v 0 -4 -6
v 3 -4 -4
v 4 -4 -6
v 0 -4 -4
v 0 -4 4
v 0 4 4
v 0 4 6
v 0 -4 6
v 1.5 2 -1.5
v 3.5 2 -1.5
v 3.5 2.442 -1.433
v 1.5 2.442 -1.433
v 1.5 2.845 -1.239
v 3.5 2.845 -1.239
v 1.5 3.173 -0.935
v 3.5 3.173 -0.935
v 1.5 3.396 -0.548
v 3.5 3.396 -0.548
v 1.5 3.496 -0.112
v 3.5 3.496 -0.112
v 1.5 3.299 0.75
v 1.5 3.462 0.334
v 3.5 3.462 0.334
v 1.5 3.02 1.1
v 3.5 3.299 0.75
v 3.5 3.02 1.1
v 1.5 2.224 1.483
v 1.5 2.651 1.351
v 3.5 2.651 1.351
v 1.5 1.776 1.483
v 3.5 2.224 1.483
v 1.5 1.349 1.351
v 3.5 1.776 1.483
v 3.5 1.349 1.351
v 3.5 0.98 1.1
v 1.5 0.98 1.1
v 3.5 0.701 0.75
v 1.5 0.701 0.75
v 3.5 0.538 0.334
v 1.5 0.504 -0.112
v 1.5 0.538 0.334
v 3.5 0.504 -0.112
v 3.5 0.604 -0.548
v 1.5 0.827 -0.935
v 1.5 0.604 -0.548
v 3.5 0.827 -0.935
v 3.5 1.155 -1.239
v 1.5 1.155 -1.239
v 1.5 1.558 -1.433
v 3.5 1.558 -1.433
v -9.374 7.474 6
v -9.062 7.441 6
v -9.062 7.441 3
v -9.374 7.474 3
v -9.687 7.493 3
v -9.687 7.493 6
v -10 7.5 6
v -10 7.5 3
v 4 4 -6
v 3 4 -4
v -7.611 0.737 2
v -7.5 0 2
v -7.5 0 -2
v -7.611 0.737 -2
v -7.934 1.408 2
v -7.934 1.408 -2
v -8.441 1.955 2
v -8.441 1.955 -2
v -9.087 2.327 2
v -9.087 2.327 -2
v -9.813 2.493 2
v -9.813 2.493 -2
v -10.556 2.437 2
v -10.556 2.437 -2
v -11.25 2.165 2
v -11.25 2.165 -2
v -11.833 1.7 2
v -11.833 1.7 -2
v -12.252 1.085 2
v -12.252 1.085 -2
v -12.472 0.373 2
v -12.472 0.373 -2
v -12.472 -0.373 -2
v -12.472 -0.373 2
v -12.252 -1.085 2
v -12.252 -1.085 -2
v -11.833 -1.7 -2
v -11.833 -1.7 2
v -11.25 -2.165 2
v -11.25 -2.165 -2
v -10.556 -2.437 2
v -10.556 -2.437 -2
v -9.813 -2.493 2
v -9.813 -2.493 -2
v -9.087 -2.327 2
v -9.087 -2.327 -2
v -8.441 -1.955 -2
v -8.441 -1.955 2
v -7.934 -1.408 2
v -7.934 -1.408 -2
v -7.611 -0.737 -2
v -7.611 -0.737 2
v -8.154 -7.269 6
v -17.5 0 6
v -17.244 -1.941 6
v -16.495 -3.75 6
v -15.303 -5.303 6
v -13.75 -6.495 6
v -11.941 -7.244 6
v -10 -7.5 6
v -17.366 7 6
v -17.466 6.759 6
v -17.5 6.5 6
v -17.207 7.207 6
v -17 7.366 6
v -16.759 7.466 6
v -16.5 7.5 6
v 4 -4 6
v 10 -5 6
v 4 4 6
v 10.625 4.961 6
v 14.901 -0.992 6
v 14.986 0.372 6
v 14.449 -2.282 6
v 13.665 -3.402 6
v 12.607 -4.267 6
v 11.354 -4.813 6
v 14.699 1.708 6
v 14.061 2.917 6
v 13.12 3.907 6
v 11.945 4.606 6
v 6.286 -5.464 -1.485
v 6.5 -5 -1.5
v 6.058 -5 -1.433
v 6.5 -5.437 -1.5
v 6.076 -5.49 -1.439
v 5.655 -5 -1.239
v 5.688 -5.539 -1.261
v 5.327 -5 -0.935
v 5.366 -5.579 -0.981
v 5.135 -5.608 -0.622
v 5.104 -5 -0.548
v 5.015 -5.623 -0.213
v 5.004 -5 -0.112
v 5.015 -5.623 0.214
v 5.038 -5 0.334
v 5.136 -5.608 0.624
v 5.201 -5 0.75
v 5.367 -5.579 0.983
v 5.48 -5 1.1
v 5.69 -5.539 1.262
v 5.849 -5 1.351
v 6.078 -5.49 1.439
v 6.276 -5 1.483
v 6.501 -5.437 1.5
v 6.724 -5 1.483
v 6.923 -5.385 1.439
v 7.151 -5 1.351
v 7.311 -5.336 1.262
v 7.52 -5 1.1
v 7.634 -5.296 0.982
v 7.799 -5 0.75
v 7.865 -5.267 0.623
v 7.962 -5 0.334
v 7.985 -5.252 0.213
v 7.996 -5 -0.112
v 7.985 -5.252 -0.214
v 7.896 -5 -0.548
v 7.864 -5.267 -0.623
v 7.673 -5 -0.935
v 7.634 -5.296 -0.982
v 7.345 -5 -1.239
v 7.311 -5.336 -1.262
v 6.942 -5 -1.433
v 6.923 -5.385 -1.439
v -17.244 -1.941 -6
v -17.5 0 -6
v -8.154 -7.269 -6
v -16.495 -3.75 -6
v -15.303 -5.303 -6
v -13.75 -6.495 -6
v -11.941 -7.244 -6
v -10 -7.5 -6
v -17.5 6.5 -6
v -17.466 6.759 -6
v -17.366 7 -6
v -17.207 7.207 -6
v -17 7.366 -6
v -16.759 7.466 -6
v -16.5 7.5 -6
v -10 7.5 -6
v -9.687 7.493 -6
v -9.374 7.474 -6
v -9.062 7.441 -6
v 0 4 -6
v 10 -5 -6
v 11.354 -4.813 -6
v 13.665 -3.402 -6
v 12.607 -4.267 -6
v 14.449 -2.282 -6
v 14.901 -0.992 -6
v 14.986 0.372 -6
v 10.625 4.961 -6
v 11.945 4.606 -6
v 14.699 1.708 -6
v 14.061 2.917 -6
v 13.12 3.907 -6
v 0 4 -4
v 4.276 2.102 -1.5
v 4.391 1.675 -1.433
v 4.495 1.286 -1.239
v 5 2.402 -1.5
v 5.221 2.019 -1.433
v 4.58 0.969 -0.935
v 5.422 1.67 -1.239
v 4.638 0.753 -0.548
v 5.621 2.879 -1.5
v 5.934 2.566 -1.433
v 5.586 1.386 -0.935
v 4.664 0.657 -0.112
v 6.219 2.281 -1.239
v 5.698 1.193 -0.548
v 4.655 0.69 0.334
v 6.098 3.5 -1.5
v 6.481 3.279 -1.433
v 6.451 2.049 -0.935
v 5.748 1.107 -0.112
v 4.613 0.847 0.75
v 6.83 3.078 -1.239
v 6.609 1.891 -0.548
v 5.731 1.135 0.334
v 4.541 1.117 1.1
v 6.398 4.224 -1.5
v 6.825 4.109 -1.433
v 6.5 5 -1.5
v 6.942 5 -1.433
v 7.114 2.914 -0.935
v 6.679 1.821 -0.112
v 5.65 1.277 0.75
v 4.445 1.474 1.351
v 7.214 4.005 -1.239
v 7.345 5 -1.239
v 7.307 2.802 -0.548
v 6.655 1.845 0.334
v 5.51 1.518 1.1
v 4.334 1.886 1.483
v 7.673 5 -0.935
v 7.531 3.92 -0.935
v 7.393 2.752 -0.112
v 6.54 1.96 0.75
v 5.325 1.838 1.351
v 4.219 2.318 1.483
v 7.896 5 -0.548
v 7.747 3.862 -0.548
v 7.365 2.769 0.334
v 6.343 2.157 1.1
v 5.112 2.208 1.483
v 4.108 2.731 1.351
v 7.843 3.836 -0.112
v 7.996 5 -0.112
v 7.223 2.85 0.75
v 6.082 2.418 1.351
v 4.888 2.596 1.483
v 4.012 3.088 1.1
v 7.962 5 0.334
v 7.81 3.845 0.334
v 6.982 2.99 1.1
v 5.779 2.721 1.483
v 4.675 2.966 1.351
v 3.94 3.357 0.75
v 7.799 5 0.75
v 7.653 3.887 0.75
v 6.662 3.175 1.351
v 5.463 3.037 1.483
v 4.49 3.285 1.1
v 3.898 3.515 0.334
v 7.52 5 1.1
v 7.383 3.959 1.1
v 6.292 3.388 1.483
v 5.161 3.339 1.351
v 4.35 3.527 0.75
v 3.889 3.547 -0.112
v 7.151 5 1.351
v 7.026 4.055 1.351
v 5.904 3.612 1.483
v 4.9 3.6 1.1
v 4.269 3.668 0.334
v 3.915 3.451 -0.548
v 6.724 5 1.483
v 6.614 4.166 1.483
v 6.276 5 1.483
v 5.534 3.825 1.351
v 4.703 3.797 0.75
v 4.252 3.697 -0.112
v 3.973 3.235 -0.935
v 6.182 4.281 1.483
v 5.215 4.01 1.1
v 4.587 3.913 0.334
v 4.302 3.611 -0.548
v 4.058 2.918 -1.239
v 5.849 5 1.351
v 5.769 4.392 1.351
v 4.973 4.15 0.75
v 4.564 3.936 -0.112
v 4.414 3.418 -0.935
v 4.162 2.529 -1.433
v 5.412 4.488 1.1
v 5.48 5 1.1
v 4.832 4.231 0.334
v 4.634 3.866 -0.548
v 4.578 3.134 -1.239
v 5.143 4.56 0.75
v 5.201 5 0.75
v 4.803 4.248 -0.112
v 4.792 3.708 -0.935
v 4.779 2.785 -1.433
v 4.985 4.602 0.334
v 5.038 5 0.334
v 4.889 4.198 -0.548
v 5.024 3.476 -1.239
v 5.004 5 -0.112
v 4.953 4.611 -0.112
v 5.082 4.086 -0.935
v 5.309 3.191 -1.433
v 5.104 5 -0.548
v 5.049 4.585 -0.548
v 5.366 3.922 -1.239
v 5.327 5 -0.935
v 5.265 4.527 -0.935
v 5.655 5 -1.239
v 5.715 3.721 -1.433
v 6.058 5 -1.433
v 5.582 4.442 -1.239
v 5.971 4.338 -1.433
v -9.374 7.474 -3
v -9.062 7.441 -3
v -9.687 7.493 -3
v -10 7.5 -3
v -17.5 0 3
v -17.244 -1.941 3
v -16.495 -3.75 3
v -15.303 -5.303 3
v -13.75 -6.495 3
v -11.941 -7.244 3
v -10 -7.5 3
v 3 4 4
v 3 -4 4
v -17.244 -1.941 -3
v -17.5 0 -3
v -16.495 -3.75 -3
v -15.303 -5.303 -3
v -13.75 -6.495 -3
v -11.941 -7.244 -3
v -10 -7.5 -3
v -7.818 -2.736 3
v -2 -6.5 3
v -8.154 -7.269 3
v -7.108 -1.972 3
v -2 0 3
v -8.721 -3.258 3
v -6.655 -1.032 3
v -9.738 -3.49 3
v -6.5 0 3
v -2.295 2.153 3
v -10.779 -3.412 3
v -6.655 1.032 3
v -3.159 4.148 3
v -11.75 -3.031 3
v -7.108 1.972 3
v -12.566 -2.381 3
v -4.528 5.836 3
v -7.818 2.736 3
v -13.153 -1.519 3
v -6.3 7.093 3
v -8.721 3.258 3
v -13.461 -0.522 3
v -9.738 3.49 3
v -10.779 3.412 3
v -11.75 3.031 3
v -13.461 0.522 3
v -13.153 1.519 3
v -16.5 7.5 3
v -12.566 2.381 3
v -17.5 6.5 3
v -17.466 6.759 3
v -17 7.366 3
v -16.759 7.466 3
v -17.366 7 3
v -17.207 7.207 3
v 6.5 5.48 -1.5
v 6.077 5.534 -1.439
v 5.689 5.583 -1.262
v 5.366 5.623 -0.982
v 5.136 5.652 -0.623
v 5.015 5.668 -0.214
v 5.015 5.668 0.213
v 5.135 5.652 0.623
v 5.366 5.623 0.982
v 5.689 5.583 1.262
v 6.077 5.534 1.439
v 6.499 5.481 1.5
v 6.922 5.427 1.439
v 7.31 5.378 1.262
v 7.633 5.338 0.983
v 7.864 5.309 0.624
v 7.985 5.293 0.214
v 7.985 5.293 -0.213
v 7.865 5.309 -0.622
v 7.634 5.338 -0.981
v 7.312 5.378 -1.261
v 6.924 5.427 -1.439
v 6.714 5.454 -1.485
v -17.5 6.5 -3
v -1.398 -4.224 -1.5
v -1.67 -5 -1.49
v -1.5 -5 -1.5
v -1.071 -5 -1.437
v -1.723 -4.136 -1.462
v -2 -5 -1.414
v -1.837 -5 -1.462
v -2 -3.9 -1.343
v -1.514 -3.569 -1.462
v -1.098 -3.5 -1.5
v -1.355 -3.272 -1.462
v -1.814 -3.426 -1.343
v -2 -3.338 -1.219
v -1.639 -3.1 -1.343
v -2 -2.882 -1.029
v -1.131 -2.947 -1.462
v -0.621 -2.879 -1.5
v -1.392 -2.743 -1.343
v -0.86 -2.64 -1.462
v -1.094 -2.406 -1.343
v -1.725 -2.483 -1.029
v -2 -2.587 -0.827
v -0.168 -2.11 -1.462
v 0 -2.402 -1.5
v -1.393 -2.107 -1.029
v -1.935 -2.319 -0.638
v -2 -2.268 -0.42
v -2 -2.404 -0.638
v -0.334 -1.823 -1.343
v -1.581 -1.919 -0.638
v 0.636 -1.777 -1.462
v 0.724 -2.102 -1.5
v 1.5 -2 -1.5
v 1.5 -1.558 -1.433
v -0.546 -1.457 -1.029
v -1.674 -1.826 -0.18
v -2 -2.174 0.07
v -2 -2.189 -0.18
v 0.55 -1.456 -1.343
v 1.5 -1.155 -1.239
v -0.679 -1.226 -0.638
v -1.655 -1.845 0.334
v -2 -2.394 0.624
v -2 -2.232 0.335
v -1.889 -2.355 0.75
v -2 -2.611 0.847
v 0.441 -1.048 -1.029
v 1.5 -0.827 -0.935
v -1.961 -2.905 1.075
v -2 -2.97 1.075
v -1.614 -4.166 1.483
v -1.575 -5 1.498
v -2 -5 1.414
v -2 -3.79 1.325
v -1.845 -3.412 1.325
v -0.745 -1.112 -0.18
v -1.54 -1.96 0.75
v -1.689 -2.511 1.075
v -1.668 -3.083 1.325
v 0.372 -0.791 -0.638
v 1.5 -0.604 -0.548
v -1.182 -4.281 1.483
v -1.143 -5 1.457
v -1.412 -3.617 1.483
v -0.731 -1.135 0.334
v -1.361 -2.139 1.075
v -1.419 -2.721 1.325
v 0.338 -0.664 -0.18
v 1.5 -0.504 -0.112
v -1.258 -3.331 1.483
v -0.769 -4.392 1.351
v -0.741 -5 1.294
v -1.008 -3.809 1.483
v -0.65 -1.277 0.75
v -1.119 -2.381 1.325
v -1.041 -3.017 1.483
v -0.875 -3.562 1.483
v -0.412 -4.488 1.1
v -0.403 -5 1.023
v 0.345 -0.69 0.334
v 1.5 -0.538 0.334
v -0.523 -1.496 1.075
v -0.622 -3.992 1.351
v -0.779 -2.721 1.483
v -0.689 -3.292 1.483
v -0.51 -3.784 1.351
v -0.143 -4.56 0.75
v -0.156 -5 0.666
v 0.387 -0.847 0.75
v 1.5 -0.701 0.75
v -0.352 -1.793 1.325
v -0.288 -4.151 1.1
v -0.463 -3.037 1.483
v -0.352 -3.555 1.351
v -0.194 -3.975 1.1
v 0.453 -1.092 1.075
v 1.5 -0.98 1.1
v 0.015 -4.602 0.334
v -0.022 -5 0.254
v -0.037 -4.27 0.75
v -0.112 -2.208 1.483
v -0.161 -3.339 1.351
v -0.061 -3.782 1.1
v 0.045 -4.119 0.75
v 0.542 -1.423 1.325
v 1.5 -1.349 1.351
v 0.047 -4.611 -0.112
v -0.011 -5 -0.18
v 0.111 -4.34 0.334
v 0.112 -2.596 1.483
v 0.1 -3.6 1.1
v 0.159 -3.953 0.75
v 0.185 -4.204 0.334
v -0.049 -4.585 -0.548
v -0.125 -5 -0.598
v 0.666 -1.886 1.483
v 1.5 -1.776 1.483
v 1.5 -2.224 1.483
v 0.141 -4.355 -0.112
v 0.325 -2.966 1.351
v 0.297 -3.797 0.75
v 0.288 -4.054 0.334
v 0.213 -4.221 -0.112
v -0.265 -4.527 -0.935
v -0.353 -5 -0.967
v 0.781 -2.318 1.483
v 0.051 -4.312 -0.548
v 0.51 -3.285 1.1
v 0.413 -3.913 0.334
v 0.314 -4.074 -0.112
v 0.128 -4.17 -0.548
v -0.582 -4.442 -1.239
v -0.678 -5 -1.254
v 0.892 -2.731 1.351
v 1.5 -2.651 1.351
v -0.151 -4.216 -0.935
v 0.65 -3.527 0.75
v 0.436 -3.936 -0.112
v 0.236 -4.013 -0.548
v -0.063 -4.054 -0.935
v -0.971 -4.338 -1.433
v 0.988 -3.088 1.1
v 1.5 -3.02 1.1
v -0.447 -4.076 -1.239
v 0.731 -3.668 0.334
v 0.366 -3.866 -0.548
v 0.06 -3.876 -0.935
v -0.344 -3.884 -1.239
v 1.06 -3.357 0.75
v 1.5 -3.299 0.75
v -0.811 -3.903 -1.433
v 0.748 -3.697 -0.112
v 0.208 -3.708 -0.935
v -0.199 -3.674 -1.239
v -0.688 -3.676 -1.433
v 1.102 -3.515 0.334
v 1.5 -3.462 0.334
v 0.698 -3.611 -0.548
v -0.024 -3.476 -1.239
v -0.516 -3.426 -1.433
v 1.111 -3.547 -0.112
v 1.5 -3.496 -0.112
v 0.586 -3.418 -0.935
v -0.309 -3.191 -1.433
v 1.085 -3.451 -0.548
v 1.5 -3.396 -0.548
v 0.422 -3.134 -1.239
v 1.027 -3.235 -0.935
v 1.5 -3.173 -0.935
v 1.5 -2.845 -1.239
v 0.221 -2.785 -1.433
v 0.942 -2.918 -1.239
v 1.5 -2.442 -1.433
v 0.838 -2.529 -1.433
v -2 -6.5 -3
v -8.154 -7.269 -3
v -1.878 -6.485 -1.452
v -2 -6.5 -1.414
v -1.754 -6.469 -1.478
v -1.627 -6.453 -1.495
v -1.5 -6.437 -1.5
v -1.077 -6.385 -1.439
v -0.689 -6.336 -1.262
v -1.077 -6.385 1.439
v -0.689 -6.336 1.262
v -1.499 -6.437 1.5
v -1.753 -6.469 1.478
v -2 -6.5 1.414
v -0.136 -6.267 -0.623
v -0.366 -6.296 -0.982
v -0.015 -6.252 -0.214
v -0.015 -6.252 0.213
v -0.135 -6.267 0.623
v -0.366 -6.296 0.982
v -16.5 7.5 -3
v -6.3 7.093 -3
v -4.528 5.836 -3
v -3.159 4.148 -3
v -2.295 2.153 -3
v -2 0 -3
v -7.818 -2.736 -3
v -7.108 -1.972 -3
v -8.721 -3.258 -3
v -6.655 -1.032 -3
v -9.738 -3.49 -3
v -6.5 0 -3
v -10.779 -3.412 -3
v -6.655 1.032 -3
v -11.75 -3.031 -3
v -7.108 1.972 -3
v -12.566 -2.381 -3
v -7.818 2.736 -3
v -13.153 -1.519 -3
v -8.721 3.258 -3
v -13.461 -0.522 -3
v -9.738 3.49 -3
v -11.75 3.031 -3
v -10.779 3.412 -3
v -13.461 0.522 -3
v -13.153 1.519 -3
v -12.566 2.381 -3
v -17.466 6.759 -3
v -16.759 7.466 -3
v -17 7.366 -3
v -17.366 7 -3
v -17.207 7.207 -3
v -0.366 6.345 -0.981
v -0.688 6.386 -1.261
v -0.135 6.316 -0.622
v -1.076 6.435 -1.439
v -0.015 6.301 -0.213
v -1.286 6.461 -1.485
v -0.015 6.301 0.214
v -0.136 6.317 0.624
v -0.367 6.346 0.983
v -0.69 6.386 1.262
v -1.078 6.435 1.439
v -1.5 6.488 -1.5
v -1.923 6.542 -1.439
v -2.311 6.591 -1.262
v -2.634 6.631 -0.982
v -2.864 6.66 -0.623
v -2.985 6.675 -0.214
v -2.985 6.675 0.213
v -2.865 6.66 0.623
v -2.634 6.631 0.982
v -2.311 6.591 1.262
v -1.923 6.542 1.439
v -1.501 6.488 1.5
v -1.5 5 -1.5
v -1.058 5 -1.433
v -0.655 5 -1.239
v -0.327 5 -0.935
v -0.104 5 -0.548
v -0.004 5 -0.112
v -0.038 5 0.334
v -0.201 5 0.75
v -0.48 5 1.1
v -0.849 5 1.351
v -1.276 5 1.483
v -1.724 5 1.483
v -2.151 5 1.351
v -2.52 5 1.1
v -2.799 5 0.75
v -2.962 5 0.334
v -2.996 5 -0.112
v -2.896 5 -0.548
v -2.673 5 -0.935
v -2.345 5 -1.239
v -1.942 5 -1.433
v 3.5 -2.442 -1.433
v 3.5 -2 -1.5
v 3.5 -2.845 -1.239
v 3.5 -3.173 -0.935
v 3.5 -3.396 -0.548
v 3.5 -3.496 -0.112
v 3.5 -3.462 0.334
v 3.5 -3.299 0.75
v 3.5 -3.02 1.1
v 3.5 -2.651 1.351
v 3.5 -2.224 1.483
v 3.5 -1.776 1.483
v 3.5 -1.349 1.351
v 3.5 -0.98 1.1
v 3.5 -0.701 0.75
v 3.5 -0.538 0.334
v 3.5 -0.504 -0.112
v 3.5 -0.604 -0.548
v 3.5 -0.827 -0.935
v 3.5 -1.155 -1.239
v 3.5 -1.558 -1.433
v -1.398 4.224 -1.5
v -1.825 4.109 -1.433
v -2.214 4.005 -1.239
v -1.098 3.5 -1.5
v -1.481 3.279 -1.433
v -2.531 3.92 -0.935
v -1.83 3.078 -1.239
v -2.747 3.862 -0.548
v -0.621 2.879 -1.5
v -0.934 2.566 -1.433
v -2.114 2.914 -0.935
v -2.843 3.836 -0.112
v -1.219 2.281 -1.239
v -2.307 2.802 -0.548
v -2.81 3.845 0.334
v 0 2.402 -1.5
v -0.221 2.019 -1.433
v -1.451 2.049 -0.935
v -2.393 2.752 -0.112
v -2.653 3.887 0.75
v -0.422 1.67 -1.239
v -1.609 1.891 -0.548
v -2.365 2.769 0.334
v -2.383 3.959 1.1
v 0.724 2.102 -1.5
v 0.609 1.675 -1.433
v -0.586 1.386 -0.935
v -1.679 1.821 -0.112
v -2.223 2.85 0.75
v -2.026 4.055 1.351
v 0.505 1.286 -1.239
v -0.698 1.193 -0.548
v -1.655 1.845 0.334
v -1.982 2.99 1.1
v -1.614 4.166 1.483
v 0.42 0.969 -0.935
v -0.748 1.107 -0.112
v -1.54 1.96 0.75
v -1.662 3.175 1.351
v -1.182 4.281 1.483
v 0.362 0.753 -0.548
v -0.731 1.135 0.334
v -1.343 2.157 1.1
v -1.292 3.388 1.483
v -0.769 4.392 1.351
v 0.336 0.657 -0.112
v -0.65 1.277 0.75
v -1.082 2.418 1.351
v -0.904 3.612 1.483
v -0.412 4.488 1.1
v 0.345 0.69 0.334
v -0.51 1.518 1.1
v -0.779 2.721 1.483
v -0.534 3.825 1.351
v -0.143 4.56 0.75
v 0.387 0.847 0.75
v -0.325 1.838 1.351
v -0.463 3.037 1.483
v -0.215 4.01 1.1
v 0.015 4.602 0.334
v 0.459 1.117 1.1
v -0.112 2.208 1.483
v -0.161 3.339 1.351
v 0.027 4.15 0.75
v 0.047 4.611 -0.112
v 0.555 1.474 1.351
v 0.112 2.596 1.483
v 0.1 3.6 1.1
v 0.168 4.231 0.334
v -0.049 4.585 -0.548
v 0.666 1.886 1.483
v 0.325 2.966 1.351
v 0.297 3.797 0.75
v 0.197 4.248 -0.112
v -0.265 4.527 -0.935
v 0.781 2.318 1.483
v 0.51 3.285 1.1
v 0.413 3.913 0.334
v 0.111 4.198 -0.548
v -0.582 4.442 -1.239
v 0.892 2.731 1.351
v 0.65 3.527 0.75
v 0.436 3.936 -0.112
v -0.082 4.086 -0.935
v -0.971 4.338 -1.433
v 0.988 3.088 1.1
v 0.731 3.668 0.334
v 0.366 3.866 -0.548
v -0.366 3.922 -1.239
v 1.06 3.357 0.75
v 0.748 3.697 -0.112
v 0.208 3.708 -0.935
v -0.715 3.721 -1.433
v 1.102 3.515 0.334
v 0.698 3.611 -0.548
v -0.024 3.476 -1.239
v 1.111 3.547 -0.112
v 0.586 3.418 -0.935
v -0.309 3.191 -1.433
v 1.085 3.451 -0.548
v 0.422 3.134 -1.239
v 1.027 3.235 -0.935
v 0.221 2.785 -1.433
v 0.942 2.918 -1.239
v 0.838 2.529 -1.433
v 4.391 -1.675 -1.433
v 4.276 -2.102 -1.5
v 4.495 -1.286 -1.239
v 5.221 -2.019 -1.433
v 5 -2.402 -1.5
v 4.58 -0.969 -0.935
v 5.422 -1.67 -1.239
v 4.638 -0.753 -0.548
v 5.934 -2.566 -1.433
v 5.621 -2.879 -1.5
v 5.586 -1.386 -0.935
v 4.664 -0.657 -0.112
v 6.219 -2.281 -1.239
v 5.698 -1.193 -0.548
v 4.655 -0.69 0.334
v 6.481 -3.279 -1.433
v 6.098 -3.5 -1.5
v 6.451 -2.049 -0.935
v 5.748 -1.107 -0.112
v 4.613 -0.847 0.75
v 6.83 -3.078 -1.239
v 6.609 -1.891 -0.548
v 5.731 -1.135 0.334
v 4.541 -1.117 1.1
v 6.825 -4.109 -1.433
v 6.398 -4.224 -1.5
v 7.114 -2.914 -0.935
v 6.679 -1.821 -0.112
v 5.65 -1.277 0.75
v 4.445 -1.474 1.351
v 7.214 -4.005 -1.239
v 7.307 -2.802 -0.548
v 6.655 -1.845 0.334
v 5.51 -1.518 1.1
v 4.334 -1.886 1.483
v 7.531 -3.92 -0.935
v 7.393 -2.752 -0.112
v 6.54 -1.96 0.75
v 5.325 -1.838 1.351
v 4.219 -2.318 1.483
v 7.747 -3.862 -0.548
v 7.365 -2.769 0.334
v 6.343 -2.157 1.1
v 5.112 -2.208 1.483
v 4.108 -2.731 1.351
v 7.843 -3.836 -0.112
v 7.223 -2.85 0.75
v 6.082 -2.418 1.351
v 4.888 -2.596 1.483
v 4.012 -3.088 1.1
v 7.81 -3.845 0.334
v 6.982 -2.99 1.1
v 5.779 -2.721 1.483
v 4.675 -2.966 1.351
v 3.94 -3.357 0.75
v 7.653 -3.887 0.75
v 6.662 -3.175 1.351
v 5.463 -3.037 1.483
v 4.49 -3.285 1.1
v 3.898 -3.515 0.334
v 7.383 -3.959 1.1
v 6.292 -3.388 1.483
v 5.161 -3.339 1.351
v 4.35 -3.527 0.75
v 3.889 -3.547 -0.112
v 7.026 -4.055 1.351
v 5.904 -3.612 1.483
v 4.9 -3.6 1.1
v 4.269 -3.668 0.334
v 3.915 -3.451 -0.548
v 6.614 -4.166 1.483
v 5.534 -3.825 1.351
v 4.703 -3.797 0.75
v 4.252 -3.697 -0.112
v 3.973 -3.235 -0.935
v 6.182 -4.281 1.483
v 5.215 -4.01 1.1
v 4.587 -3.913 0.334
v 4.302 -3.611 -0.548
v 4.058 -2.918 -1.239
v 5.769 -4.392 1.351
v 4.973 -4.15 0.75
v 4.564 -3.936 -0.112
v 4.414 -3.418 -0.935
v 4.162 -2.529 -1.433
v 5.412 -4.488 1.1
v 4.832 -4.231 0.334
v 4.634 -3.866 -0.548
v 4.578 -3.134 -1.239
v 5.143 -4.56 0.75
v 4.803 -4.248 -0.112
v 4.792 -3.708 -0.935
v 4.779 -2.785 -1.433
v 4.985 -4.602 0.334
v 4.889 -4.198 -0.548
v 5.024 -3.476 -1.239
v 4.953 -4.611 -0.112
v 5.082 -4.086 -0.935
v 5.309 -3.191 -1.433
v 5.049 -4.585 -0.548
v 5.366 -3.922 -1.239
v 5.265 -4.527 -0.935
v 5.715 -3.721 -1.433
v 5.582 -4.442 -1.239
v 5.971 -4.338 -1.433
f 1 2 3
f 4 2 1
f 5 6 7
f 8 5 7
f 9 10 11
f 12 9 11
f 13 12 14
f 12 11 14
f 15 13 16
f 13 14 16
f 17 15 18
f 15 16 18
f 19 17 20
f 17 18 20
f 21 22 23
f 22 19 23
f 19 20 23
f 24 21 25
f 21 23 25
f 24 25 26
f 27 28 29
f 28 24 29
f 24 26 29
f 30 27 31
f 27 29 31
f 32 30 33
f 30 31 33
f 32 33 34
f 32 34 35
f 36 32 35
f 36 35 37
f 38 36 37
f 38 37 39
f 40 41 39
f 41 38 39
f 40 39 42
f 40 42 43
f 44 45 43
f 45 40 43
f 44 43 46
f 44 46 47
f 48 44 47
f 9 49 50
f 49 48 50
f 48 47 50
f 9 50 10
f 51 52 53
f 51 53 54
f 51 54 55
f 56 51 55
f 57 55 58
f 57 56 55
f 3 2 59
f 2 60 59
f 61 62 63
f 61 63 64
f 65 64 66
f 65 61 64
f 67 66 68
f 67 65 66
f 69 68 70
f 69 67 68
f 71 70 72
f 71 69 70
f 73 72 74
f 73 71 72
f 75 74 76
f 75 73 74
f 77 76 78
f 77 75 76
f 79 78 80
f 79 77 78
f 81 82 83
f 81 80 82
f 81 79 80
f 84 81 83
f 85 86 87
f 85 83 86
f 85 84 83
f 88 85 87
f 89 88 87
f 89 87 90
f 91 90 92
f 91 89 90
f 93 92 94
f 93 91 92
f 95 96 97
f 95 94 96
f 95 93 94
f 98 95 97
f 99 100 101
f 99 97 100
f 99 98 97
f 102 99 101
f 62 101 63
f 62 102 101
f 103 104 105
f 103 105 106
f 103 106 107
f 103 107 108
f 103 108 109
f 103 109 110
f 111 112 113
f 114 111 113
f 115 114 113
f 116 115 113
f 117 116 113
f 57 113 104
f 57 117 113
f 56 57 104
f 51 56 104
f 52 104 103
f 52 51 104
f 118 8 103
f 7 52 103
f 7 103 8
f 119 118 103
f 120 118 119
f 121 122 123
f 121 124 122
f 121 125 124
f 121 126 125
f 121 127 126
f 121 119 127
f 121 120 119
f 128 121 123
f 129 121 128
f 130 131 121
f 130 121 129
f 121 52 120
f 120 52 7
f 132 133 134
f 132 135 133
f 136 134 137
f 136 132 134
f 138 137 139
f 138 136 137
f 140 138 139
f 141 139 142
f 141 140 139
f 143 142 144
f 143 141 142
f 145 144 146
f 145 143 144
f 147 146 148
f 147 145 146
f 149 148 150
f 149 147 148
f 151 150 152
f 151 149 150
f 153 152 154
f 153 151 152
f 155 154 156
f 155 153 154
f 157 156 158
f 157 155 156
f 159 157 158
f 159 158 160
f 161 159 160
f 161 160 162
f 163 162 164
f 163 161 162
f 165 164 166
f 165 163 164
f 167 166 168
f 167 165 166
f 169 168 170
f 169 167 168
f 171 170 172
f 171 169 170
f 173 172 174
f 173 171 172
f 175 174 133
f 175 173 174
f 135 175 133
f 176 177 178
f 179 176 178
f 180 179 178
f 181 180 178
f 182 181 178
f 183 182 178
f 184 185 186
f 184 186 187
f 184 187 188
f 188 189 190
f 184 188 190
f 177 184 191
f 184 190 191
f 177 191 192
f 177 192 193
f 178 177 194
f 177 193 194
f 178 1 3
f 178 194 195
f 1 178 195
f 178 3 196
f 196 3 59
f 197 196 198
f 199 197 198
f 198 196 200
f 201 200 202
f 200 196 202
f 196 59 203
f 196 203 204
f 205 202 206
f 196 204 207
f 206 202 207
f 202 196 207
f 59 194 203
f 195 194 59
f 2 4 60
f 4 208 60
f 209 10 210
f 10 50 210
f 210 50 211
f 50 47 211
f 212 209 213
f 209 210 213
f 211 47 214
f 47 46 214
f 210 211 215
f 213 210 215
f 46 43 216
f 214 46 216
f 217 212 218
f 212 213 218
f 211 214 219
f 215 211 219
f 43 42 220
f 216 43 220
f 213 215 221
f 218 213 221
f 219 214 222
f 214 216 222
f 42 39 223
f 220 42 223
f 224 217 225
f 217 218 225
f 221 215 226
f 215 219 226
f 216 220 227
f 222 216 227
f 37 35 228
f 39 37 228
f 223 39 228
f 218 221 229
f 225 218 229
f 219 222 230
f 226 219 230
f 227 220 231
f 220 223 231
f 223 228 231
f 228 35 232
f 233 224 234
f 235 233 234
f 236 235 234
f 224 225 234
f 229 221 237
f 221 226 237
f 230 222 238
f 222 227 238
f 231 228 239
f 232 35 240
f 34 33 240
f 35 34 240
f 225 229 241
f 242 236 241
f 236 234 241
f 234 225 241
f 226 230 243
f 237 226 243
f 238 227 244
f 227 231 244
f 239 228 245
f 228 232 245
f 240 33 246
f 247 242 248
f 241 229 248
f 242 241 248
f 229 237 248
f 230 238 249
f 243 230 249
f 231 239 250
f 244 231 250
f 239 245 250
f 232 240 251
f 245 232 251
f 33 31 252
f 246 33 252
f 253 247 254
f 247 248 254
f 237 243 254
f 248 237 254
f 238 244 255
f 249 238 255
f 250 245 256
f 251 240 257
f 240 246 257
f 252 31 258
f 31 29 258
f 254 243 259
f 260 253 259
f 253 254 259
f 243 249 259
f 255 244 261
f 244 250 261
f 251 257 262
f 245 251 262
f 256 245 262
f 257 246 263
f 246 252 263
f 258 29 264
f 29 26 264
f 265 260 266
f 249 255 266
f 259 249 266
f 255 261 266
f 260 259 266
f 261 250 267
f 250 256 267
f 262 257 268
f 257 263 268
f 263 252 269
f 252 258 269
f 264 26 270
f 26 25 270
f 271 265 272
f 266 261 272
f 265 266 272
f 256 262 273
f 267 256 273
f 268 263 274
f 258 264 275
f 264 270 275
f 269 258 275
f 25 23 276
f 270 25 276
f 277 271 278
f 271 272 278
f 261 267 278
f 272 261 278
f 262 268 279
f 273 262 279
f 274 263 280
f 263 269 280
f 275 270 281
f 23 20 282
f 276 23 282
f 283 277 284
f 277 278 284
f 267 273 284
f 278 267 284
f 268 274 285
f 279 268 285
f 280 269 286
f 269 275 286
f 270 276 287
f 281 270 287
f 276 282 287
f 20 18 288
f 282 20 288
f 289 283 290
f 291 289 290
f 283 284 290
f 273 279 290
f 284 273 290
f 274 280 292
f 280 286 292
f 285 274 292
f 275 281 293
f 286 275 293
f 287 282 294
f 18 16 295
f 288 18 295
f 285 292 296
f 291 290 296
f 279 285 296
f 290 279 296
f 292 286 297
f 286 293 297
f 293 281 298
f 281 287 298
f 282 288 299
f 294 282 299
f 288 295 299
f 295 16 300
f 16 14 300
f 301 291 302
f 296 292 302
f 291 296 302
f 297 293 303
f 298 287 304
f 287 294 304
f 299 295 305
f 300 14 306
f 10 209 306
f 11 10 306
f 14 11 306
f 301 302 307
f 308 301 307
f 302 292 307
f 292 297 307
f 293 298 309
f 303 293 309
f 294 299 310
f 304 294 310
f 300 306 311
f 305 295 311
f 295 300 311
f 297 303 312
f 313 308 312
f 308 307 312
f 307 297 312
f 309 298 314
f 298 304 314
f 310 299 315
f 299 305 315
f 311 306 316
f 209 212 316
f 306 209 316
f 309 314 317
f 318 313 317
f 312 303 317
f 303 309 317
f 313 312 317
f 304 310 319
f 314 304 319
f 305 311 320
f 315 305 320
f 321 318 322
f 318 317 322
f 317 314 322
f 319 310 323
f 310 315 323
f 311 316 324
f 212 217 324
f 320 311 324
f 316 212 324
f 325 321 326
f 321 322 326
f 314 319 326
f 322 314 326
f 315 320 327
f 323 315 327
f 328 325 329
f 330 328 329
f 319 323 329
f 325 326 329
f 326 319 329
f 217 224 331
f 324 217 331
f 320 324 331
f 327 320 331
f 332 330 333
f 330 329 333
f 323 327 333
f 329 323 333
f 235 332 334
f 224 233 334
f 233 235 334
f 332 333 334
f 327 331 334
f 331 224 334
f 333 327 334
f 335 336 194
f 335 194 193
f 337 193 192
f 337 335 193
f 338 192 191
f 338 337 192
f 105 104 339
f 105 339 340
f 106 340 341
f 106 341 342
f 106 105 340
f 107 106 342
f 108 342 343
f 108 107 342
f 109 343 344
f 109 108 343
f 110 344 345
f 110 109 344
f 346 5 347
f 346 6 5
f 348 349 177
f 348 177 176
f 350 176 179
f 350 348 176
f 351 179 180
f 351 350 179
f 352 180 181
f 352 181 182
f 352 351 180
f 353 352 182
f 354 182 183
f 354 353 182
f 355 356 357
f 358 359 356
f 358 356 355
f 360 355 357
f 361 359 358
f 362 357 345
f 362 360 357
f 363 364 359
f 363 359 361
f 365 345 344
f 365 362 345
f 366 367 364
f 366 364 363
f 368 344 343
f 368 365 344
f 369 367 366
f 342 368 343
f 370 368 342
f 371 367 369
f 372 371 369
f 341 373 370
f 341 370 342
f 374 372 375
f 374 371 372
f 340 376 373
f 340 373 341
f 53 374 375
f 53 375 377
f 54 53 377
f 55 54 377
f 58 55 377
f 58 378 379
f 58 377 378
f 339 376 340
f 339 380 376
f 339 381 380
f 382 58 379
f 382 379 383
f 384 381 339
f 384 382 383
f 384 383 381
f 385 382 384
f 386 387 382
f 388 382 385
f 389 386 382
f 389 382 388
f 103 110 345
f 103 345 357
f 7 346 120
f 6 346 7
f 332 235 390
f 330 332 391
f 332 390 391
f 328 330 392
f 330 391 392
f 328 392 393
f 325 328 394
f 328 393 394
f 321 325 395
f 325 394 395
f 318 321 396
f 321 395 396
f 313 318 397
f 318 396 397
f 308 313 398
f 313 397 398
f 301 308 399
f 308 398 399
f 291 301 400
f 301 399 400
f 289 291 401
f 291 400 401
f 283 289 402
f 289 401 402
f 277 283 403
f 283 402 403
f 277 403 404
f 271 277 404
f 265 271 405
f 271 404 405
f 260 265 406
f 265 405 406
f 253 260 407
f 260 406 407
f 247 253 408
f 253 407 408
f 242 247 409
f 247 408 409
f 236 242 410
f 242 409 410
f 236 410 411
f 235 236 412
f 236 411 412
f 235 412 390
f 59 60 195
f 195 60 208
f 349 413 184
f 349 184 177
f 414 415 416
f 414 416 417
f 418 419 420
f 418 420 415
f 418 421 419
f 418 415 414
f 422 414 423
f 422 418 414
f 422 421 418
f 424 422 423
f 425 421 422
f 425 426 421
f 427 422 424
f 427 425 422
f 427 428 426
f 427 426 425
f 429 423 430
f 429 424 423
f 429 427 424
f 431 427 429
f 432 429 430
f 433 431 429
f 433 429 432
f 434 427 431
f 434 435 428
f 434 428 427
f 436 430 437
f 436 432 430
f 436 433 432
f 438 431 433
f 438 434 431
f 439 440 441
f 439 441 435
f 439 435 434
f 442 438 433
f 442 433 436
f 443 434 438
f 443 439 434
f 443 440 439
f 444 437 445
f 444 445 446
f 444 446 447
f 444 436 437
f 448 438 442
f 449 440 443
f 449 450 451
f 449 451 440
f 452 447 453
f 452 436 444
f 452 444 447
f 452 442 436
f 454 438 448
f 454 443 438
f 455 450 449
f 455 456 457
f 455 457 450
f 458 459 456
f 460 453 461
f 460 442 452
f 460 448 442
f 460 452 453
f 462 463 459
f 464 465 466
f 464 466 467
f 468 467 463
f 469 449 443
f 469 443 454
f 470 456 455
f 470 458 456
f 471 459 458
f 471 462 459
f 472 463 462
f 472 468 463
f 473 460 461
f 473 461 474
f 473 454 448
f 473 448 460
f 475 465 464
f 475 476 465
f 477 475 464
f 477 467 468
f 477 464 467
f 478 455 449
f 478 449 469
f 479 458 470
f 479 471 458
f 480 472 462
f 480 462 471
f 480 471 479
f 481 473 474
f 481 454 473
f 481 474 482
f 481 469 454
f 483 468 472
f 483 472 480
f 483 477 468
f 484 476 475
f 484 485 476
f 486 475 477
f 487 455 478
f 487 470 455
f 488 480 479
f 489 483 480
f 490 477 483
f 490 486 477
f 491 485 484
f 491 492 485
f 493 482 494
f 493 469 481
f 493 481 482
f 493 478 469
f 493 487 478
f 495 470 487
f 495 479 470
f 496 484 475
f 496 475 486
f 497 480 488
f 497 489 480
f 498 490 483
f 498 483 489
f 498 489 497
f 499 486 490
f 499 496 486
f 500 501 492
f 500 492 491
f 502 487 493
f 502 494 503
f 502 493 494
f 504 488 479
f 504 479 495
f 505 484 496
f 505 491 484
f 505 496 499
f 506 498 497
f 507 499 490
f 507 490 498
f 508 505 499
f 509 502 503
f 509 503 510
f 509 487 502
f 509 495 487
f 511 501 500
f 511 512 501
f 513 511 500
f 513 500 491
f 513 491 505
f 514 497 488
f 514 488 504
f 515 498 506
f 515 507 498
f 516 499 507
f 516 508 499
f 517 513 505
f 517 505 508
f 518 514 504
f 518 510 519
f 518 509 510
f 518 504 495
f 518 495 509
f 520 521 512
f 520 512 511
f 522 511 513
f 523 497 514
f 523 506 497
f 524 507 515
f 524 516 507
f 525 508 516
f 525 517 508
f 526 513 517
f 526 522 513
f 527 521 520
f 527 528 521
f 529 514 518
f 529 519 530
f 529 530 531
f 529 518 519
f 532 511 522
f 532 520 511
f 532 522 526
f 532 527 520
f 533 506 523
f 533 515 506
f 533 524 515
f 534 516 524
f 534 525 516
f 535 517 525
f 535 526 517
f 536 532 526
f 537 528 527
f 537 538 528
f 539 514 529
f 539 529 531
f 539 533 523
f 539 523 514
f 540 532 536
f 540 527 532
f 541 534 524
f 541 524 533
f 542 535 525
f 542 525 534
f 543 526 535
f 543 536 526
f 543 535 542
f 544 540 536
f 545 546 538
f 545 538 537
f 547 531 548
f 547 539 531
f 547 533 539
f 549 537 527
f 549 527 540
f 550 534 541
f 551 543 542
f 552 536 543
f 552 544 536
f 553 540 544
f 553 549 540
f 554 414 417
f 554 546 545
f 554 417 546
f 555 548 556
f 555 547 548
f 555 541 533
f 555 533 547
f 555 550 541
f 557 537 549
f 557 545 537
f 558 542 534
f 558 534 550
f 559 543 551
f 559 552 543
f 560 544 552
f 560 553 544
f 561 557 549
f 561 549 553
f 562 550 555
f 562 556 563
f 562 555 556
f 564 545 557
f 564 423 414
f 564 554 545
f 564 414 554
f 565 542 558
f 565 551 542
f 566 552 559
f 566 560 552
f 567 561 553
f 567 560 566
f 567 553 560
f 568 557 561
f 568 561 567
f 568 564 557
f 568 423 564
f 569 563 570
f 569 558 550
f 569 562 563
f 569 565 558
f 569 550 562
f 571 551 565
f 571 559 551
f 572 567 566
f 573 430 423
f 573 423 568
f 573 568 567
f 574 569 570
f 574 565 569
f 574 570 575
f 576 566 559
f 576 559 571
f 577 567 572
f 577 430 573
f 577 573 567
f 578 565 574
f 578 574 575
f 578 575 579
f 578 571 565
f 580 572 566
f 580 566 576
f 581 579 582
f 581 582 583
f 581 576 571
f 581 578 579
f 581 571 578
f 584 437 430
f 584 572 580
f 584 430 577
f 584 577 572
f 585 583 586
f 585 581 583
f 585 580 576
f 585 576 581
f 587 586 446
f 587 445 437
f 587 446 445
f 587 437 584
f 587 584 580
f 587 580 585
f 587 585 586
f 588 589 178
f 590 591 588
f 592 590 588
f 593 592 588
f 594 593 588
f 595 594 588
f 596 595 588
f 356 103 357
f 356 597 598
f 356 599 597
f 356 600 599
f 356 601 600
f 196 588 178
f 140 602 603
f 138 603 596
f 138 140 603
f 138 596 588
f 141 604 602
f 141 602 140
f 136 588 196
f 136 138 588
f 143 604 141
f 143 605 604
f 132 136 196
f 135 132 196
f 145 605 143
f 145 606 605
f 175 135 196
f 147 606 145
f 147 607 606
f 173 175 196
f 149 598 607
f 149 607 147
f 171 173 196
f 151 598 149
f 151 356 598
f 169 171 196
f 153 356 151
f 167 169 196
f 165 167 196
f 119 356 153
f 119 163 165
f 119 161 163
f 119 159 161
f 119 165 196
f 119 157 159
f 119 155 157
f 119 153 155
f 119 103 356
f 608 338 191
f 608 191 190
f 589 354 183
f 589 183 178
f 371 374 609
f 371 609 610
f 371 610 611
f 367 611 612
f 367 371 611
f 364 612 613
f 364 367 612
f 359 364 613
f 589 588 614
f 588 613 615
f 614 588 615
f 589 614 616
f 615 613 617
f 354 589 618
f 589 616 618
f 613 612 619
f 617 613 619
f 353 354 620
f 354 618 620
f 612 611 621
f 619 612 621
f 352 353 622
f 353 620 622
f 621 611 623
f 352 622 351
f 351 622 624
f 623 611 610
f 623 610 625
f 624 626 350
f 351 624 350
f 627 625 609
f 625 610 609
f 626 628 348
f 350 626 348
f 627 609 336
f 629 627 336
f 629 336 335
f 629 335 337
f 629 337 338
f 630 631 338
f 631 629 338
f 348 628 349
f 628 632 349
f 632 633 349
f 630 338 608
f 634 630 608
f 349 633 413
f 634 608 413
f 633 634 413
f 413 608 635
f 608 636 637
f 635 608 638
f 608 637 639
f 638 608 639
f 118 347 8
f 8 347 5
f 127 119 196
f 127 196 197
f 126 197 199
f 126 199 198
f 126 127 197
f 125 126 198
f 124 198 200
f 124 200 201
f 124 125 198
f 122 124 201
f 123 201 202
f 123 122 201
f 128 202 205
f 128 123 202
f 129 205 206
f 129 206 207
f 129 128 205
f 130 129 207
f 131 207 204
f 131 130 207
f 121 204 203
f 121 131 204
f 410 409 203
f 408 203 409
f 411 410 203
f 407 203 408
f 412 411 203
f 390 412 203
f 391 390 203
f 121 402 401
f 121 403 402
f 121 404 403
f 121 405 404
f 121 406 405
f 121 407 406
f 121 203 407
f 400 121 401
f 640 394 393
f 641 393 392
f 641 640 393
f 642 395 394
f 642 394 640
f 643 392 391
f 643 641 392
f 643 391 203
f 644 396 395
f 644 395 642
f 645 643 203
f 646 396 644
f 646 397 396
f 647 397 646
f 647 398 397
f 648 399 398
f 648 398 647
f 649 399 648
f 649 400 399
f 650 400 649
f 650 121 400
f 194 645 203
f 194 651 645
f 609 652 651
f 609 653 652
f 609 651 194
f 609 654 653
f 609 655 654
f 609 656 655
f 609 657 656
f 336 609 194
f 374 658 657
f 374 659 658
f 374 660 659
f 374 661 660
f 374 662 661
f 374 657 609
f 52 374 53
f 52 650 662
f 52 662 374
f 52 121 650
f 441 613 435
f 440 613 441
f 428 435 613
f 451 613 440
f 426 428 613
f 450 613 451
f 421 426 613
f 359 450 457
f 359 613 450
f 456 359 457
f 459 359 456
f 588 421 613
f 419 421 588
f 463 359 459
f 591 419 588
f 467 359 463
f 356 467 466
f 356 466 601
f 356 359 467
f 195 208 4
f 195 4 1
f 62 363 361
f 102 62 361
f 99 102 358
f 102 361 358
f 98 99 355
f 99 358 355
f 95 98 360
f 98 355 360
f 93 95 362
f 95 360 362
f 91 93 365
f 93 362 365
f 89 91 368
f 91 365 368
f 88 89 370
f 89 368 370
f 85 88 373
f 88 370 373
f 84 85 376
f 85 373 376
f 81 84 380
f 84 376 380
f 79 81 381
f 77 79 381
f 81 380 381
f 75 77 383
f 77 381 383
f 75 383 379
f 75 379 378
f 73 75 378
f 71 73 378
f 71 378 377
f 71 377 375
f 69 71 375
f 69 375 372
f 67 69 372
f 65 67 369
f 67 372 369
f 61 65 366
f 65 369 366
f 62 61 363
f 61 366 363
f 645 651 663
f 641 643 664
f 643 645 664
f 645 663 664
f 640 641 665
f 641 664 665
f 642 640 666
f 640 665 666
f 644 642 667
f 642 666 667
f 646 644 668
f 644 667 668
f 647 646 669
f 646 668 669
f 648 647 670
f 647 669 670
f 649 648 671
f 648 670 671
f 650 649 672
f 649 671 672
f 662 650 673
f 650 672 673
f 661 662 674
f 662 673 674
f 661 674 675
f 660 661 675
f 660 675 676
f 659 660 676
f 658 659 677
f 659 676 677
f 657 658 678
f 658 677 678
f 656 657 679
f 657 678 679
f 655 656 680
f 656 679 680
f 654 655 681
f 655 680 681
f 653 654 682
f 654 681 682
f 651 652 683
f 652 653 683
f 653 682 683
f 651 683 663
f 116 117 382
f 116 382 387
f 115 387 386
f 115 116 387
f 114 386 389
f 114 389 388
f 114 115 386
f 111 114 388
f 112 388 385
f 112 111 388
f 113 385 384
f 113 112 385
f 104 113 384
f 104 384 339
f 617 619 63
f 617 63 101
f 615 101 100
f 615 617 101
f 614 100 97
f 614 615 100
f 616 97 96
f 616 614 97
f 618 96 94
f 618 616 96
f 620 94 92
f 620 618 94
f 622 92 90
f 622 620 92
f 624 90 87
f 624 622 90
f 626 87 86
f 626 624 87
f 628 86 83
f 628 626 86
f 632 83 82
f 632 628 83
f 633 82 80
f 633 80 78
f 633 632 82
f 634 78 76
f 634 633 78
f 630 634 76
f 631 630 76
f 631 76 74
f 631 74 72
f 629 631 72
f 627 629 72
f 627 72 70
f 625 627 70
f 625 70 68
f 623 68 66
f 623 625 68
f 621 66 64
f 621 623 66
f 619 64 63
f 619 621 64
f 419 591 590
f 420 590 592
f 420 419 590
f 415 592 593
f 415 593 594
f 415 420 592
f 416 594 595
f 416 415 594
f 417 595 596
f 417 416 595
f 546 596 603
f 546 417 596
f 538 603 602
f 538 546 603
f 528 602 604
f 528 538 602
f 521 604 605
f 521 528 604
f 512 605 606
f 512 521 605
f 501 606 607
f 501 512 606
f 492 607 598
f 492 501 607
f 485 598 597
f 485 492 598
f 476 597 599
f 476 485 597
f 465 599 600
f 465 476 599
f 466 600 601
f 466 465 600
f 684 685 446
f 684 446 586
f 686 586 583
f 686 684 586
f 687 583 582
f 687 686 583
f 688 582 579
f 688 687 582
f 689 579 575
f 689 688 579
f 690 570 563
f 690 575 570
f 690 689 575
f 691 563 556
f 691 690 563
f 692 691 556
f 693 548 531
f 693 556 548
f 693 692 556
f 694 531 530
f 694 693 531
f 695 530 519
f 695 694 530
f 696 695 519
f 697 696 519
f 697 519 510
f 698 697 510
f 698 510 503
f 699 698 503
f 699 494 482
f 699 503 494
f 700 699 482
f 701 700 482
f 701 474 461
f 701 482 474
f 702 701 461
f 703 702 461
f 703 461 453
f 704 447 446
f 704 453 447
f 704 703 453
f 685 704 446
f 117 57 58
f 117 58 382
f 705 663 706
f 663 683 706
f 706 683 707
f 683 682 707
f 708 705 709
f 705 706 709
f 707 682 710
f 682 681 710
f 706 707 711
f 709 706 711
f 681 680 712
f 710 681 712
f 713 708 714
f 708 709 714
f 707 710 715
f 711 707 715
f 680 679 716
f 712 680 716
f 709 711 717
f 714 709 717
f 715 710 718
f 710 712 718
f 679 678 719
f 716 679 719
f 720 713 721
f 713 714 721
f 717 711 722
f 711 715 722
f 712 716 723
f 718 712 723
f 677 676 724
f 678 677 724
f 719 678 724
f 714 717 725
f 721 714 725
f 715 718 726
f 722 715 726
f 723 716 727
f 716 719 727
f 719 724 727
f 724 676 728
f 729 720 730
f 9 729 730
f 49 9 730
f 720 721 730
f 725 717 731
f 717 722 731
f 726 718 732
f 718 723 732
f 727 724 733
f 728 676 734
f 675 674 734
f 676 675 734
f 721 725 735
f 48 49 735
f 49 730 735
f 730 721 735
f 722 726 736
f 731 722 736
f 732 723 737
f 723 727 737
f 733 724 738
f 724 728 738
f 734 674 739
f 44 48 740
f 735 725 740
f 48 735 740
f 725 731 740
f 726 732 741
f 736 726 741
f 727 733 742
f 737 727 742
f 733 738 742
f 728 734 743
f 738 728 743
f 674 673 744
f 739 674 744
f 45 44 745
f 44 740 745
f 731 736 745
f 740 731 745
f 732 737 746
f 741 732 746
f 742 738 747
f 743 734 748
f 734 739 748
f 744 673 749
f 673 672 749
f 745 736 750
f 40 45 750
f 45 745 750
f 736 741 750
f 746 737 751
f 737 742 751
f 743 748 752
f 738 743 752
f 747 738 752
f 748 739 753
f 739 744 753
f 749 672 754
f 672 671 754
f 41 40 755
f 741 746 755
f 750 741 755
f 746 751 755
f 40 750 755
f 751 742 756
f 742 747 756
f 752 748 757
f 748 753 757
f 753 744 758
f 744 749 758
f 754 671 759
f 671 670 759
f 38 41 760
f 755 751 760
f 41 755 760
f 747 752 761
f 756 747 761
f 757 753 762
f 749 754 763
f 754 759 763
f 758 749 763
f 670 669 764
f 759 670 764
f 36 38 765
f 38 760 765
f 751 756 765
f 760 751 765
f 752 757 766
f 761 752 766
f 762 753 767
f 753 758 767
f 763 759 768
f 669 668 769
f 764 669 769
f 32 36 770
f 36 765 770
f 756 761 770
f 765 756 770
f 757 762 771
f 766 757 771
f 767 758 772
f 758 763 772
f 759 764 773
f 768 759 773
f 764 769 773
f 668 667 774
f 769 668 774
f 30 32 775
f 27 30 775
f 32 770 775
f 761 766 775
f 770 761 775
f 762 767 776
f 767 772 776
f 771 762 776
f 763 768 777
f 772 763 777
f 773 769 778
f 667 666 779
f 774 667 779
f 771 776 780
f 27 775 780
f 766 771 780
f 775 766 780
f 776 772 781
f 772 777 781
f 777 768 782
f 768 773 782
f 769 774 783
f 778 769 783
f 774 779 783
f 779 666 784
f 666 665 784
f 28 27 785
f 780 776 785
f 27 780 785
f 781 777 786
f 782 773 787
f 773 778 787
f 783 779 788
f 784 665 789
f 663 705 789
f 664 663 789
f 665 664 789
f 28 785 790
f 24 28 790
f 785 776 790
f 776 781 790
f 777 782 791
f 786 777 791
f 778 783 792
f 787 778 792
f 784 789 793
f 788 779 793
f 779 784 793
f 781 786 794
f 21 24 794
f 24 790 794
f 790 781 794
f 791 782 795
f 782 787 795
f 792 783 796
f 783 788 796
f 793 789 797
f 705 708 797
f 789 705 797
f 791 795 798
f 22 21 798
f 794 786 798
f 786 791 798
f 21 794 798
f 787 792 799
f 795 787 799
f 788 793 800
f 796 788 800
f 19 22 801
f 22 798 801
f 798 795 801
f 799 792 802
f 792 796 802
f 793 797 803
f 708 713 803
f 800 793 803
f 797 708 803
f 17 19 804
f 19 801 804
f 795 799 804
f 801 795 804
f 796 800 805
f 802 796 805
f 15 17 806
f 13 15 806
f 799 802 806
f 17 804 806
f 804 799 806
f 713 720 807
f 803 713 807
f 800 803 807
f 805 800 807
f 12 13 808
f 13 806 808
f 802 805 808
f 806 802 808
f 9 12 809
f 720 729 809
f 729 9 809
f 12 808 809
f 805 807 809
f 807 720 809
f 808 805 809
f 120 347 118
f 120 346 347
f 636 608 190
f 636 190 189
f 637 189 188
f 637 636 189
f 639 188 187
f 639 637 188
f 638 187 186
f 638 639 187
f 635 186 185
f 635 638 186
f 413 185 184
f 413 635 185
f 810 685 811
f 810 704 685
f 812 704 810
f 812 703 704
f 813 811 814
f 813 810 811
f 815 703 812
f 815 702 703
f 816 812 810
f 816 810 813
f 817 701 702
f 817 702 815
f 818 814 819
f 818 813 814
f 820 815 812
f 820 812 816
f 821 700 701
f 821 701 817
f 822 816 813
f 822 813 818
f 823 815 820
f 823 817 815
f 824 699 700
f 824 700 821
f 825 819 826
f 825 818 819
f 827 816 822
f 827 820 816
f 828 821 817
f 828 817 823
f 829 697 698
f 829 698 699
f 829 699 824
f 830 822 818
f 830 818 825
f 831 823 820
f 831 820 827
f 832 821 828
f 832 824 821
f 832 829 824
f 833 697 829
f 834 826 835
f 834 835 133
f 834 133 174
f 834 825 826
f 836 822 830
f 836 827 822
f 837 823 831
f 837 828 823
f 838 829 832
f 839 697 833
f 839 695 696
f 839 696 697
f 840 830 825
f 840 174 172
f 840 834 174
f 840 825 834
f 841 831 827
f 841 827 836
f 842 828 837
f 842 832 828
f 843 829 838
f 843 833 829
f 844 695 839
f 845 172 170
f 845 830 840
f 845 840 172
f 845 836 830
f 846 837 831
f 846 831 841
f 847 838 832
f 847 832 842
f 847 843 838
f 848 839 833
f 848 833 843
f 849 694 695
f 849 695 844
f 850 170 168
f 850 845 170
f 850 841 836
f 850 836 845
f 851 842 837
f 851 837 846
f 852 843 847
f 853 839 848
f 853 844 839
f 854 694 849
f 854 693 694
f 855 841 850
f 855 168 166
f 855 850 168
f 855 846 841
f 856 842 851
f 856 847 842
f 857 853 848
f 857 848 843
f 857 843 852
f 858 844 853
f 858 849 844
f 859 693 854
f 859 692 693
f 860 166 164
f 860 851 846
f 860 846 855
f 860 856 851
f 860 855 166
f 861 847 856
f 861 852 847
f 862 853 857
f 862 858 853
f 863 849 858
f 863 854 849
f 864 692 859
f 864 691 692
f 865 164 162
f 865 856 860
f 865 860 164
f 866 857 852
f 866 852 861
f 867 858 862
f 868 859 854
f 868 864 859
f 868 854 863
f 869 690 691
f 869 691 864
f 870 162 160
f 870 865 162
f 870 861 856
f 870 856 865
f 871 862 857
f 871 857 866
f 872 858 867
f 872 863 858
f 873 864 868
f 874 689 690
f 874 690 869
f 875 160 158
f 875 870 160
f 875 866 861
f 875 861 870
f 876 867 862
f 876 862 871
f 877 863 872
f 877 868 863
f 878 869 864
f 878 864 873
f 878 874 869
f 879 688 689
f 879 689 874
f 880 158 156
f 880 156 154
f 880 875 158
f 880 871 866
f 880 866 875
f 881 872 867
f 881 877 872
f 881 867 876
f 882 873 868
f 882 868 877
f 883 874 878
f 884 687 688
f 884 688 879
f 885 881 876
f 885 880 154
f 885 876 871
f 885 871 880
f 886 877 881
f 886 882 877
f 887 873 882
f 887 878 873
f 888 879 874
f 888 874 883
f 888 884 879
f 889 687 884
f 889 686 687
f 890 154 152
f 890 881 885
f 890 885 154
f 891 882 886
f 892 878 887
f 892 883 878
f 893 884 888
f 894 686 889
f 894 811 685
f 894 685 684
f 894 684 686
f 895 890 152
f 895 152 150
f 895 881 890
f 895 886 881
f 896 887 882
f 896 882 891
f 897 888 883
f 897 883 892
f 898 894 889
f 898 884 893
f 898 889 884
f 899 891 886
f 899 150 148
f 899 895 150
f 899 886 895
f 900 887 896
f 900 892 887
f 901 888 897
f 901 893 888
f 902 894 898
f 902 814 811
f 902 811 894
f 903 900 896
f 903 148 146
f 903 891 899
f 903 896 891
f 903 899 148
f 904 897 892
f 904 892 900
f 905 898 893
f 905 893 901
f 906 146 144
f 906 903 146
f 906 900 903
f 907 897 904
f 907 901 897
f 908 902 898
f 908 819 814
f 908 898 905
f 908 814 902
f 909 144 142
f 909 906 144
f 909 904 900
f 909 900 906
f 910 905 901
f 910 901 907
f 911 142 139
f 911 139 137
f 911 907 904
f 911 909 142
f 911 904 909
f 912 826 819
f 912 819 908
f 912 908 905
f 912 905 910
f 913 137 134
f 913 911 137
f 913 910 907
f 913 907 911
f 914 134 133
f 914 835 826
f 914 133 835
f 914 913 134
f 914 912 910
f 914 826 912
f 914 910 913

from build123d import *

# Parameters (mm, degrees)
BOSS_EXTRUDE1_DEPTH  = 6
SKETCH1_3_R          = 2.5000000000000004
BOSS_EXTRUDE2_DEPTH  = 6
BOSS_EXTRUDE3_DEPTH  = 6
CUT_EXTRUDE3_DEPTH   = 3
CUT_SWEEP5_PROFILE_R = 1.5
SKETCH1_7_R          = 2.5000000000000004
BOSS_EXTRUDE4_DEPTH  = 6
CHAMFER1_SIZE        = 1
CUT_EXTRUDE4_DEPTH   = 4


with BuildPart() as part:
    # Sketch1 → Boss-Extrude1 (new, symmetric)
    with BuildSketch(Plane.XY):
        with BuildLine():
            Line((10.624999999999998, 4.960783708246109), (-9.062500000000002, 7.4411755623691604))
            ThreePointArc((-9.062499999999998, 7.4411755623691604), (-2.514267183902718, 0.46238966900684386), (-8.153846153846445, -7.269230769230843))
            Line((-8.153846153846452, -7.2692307692308065), (10, -5))
            ThreePointArc((10.000000000000004, -4.999999999999998), (5.009813703816735, 0.31311456271583826), (10.625, 4.9607837082461055))
        make_face()
    extrude(amount=BOSS_EXTRUDE1_DEPTH, both=True)

    # Sketch1<3> → Boss-Extrude2 (add, symmetric)
    with BuildSketch(Plane.XY):
        with BuildLine():
            ThreePointArc((-8.153846153846445, -7.269230769230843), (-2.514267183902718, 0.46238966900684386), (-9.062499999999998, 7.4411755623691604))
            ThreePointArc((-9.062499999999998, 7.4411755623691604), (-9.530328155926242, 7.4852794442749), (-9.999999999999998, 7.5))
            Line((-10, 7.5), (-16.499999999999993, 7.5))
            ThreePointArc((-16.499999999999993, 7.499999999999999), (-17.207106781186546, 7.207106781186547), (-17.5, 6.499999999999993))
            Line((-17.5, 6.499999999999993), (-17.5, 0))
            ThreePointArc((-17.5, 0), (-15.303300858899107, -5.303300858899105), (-10.000000000000002, -7.5))
            Line((-10, -7.5), (-8.153846153846452, -7.2692307692308065))
        make_face()
        with Locations((-10, 0)):
            Circle(SKETCH1_3_R, mode=Mode.SUBTRACT)
    extrude(amount=BOSS_EXTRUDE2_DEPTH, both=True)

    # Sketch1<5> → Boss-Extrude3 (add, symmetric)
    with BuildSketch(Plane.XY):
        with BuildLine():
            ThreePointArc((14.999999999999998, 0), (13.749999999999998, 3.3071891388307373), (10.625, 4.9607837082461055))
            ThreePointArc((10.625, 4.9607837082461055), (5.009813703816735, 0.31311456271583826), (10.000000000000004, -4.999999999999998))
            ThreePointArc((9.999999999999998, -4.999999999999998), (13.535533905932736, -3.5355339059327373), (14.999999999999998, -1.22e-15))
        make_face()
    extrude(amount=BOSS_EXTRUDE3_DEPTH, both=True)

    # Sketch2 → Cut-Extrude3 (cut, symmetric)
    with BuildSketch(Plane.XY):
        with BuildLine():
            Line((-1.9999999999999991, -7.999999999999998), (-2, 9.8e-16))
            ThreePointArc((-2, 9.8e-16), (-4.343145750507631, 5.656854249492391), (-10.000000000000028, 7.999999999999998))
            Line((-10.000000000000028, 7.999999999999998), (-18, 8.108199506438751))
            Line((-18, 8.108199506438751), (-18, -5.586e-14))
            ThreePointArc((-18, -5.586e-14), (-15.656854249492358, -5.656854249492399), (-9.999999999999998, -7.999999999999997))
            Line((-9.999999999999998, -7.9999999999999964), (-1.9999999999999991, -7.999999999999998))
        make_face()
    extrude(amount=CUT_EXTRUDE3_DEPTH, both=True, mode=Mode.SUBTRACT)

    # Cut-Sweep5: sweep along a path in Sketch3
    with BuildLine(Plane.XY) as cut_sweep5_path:
        Line((-1.5, 8.191992315378618), (-1.5, 6.488390119991735))
        Line((-1.5, 6.488390119991735), (-1.5000000000000004, 5.000000000000001))
        ThreePointArc((-1.5000000000000004, 5.000000000000001), (-0.6213203435596422, 2.878679656440358), (1.5000000000000004, 2.0000000000000004))
        Line((1.5000000000000004, 2.0000000000000004), (3.4999999999999987, 1.9999999999999996))
        ThreePointArc((3.4999999999999987, 1.9999999999999996), (5.621320343559642, 2.8786796564403576), (6.5, 5.000000000000001))
        Line((6.5, 5.000000000000001), (6.5, 5.480484858633797))
        Line((6.5, 5.480484858633797), (6.5, 8.191992315378616))
    # Cut-Sweep5 profile (on start of the path) → Cut-Sweep5 (sweep, cut)
    with BuildSketch(Plane(origin=(-1.5, 8.191992315378618, 0), x_dir=(0, 0, -1), z_dir=(0, -1, 0))):
        Circle(CUT_SWEEP5_PROFILE_R)
    cut_sweep5 = sweep(path=cut_sweep5_path.line, mode=Mode.SUBTRACT)

    # Mirror4: Cut-Sweep5 across plane
    add(cut_sweep5.mirror(Plane.ZX), mode=Mode.SUBTRACT)

    # Sketch1<7> → Boss-Extrude4 (add, symmetric)
    with BuildSketch(Plane.XY):
        with Locations((-10, 0)):
            Circle(SKETCH1_7_R)
    extrude(amount=BOSS_EXTRUDE4_DEPTH, both=True)

    # Chamfer1
    chamfer1_edges = [part.edges().sort_by_distance(p)[0] for p in [
        (-12.5, -3.1e-16, 3),
        (-12.5, -3.1e-16, -3),
    ]]
    chamfer(chamfer1_edges, length=CHAMFER1_SIZE)

    # Sketch130 → Cut-Extrude4 (cut, symmetric)
    with BuildSketch(Plane(origin=(0, 0, 0), x_dir=(1, 0, 0), z_dir=(0, 1, 0))):
        Polygon((0, -6), (0, -4), (3, -4), (4.000000000000002, -6), (4.000000000000002, -8.476045259091649), (0, -8.476045259091649), align=None)
    cut_extrude4 = extrude(amount=CUT_EXTRUDE4_DEPTH, both=True, mode=Mode.SUBTRACT)

    # Mirror5: Cut-Extrude4 across plane
    add(cut_extrude4.mirror(Plane.XY), mode=Mode.SUBTRACT)


solid = part.part
